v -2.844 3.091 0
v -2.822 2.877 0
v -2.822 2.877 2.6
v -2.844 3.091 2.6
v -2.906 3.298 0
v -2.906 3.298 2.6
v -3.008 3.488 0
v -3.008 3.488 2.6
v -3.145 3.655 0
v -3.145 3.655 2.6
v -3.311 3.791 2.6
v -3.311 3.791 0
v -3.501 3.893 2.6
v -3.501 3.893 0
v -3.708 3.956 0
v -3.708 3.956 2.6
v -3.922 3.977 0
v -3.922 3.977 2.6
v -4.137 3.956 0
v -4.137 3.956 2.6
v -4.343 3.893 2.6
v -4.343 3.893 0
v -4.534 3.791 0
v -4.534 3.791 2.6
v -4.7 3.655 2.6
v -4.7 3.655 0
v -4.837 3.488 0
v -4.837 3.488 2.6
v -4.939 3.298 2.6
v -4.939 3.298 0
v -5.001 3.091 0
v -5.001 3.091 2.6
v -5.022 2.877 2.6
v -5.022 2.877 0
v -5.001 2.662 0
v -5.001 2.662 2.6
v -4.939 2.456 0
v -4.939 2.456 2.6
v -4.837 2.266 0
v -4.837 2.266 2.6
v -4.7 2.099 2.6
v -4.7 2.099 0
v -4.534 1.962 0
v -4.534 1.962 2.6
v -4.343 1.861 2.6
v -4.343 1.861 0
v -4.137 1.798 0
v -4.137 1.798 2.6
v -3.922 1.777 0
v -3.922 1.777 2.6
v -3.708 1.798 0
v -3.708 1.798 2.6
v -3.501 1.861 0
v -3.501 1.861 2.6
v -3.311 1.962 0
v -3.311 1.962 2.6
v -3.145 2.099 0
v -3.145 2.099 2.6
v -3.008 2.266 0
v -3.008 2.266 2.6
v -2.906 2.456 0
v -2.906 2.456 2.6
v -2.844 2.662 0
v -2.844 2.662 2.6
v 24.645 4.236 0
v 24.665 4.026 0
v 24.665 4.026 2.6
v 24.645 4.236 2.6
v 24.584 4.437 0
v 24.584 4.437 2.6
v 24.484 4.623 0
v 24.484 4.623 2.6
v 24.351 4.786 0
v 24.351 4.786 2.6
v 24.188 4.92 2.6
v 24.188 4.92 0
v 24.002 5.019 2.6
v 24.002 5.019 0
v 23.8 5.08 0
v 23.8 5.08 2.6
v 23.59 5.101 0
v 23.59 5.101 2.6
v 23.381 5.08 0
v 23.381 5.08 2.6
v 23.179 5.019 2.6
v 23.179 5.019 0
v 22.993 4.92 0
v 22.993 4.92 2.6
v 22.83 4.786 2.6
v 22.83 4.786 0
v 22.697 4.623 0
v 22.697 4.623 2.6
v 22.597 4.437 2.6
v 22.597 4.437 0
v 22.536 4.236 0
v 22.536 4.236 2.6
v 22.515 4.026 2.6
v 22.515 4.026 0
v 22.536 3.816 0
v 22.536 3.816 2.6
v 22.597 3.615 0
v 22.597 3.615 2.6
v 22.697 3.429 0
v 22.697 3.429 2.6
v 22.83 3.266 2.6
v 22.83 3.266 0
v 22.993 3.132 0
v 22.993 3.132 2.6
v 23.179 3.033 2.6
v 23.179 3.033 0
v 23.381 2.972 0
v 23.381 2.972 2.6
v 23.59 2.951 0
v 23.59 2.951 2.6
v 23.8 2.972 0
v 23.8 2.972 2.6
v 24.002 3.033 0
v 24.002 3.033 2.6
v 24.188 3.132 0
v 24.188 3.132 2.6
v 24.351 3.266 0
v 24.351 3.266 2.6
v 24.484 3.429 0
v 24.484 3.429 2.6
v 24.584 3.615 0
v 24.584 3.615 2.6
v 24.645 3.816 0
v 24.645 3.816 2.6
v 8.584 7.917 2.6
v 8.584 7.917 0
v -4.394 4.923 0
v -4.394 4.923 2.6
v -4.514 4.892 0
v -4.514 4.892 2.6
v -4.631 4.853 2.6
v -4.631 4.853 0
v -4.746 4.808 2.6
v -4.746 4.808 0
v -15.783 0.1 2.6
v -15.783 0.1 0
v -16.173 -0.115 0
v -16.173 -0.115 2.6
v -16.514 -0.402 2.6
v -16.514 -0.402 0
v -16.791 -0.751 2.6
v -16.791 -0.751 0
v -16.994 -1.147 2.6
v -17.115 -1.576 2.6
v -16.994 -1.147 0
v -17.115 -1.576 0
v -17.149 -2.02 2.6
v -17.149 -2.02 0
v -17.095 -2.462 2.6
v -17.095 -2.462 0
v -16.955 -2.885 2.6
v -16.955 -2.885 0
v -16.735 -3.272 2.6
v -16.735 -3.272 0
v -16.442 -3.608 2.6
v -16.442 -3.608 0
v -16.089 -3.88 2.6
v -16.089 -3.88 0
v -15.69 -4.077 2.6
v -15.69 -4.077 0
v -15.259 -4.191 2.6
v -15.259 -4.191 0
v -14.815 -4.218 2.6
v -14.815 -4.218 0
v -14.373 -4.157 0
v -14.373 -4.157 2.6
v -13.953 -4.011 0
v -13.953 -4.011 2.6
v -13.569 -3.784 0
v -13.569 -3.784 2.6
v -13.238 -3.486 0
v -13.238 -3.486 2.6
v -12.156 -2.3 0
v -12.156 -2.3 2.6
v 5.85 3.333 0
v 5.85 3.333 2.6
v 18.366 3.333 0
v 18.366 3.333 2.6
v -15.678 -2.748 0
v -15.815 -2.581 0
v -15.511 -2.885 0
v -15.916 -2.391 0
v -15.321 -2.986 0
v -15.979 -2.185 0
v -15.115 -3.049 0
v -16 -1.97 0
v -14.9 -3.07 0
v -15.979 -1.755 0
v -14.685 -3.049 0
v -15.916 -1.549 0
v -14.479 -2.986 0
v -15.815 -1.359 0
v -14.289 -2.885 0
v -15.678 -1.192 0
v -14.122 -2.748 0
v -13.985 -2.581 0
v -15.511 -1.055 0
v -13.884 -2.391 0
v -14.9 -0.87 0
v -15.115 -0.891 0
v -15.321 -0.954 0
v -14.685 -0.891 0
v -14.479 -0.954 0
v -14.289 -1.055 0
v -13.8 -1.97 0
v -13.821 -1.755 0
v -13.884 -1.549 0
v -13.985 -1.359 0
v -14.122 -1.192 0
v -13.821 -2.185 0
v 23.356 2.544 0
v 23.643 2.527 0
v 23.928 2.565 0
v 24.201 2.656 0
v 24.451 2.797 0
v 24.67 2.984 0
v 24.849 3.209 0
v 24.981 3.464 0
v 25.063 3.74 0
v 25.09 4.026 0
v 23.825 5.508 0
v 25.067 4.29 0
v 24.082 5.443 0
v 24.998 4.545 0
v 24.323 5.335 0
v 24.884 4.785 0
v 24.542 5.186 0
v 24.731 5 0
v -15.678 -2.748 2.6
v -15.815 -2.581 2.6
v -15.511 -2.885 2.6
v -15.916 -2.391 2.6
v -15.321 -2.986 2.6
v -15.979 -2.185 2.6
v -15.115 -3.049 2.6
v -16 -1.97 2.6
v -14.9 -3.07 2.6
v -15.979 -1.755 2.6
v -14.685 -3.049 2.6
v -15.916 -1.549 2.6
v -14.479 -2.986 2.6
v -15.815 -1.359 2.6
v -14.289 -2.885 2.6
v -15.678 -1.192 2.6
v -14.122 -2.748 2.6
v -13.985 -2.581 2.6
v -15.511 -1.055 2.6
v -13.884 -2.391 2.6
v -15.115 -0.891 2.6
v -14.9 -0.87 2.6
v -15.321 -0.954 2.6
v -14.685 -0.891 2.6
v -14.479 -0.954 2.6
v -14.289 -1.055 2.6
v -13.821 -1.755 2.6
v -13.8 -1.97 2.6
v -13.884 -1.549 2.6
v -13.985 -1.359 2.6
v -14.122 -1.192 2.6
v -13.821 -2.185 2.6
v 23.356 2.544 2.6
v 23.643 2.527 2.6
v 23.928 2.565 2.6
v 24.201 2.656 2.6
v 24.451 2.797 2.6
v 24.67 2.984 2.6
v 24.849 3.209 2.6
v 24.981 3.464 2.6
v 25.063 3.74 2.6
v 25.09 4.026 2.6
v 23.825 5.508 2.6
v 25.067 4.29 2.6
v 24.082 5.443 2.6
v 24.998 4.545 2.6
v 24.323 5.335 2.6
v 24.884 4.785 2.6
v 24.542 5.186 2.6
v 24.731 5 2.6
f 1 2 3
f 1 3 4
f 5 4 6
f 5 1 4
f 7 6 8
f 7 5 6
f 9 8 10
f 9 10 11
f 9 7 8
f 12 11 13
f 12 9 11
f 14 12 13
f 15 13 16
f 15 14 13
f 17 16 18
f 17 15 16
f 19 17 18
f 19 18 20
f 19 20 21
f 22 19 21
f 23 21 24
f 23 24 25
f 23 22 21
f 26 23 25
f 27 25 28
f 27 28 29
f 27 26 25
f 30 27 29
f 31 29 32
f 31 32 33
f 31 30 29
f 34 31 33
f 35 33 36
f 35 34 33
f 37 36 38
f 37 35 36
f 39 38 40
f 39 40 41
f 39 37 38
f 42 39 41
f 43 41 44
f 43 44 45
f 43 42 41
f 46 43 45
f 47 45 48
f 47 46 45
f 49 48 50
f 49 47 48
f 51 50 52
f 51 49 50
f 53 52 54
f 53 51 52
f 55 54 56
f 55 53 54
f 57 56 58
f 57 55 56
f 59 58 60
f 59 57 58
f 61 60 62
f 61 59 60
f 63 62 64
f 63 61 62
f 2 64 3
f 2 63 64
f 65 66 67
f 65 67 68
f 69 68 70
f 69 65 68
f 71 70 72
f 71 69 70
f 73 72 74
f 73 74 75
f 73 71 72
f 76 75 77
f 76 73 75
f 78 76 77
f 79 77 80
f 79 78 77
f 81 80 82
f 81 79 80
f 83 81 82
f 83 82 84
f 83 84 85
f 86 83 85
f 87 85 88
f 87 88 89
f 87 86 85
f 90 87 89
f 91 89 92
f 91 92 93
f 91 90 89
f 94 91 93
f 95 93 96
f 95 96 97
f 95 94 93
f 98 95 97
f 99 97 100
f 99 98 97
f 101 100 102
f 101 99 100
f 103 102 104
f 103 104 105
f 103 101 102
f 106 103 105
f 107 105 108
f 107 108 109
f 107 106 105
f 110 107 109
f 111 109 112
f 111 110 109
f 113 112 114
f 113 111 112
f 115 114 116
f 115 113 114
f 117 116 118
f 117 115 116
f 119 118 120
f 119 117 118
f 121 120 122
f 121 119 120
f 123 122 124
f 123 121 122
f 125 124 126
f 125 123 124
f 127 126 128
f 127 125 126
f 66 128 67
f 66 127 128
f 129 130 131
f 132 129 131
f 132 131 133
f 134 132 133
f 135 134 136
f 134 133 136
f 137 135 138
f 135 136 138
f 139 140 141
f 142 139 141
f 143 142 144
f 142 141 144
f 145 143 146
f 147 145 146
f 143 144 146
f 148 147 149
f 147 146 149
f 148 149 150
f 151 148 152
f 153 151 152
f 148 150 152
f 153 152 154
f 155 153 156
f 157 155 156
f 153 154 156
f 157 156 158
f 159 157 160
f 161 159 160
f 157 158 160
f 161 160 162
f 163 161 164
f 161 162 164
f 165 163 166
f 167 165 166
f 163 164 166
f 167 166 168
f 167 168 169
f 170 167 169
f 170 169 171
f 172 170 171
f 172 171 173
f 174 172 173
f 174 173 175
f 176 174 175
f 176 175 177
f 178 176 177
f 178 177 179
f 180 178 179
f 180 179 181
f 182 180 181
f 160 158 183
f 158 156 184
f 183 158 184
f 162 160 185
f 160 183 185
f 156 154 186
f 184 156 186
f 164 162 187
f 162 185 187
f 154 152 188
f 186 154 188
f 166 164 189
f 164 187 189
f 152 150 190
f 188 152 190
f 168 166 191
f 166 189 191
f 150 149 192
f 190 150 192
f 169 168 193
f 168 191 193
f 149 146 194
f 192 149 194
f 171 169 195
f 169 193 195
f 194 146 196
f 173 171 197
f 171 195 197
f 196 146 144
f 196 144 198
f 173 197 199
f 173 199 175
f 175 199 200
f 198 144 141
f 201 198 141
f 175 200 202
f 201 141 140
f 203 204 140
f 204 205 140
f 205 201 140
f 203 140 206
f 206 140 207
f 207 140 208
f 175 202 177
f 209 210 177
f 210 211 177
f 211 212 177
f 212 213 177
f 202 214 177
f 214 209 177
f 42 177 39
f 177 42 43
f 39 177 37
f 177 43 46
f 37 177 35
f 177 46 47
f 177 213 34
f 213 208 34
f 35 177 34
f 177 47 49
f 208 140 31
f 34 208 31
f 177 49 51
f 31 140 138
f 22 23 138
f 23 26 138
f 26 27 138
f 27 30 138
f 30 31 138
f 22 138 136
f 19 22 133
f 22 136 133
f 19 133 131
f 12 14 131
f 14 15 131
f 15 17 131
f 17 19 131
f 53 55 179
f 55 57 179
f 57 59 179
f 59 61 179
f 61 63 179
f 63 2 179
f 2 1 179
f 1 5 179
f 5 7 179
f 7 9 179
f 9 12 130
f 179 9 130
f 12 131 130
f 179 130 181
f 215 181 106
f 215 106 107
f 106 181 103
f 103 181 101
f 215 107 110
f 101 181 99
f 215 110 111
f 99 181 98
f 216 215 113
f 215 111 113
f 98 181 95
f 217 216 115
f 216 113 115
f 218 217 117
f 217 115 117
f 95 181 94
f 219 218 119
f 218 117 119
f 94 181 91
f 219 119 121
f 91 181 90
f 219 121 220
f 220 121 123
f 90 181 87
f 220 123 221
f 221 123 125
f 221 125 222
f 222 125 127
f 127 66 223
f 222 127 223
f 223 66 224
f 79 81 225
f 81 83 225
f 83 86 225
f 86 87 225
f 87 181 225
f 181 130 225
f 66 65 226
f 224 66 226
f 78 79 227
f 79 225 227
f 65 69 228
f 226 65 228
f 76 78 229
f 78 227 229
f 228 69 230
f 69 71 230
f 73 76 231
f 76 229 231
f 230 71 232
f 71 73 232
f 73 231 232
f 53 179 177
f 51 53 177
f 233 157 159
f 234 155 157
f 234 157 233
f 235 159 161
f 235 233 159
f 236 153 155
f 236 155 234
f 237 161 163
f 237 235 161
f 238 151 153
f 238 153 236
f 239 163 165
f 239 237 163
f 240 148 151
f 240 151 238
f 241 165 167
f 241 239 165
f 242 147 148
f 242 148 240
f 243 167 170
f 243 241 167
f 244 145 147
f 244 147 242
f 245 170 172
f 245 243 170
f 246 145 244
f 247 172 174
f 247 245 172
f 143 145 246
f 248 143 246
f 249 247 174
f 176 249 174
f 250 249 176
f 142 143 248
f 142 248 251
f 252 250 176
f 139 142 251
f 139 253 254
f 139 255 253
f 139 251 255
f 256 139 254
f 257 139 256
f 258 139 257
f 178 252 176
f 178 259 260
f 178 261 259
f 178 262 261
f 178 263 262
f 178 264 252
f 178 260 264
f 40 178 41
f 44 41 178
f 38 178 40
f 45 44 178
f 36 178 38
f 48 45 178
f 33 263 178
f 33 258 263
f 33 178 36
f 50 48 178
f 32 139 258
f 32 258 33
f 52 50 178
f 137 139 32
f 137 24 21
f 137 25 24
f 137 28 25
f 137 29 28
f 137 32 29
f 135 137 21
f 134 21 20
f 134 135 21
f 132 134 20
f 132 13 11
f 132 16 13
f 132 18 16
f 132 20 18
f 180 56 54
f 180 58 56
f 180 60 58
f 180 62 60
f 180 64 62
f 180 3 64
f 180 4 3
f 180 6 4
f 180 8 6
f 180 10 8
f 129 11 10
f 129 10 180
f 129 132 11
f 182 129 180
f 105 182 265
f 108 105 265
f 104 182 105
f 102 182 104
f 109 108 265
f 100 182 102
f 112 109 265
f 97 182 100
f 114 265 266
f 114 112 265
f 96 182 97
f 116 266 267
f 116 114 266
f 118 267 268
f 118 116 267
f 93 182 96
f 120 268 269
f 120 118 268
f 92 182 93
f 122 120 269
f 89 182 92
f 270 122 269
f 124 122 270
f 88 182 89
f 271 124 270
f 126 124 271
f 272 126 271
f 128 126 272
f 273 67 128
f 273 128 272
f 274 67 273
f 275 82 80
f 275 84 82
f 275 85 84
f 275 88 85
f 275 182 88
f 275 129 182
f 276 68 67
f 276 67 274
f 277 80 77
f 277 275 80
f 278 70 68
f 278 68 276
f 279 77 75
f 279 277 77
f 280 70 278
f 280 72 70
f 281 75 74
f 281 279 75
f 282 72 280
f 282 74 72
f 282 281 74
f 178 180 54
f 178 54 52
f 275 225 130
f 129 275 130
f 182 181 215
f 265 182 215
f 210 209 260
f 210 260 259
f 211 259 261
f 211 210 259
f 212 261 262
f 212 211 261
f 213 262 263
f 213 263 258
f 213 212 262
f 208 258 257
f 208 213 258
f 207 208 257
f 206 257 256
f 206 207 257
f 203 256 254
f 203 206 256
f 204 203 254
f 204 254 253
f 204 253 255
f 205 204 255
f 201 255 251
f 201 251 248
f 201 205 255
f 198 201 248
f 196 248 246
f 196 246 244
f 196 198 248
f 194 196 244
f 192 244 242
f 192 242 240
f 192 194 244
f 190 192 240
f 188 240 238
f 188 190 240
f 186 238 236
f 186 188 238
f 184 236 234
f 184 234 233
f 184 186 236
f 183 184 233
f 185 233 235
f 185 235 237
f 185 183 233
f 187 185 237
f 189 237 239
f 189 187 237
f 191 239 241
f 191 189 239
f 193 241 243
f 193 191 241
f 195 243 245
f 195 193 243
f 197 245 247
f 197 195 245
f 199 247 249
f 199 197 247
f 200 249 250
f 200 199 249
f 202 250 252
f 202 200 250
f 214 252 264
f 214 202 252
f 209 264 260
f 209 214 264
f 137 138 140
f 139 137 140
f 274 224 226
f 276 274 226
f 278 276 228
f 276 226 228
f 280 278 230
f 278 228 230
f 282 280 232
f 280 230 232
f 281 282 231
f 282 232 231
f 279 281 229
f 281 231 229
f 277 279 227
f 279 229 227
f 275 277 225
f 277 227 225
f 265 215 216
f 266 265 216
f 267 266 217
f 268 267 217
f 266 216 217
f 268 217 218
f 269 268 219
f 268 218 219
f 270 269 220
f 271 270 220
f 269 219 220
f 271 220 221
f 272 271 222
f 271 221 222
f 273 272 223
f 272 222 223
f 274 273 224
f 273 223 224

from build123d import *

# Parameters (mm, degrees)
F0_R     = 1.1
F0_R_2   = 1.075
F1_DEPTH = 2.6


with BuildPart() as f1:
    # F0 (on Top) → F1 (new body)
    with BuildSketch(Plane.XY):
        with BuildLine():
            ThreePointArc((-4.746486, 4.808329), (-5.079824, 1.124576), (-1.822392, 2.876799))
            ThreePointArc((-1.822392, 2.876799), (-2.614969, 4.520158), (-4.394433, 4.923045))
            ThreePointArc((-4.394433, 4.923045), (-4.572993, 4.873462), (-4.746486, 4.808329))
        make_face()
        with Locations((-3.922381, 2.876799)):
            Circle(F0_R, mode=Mode.SUBTRACT)
        with BuildLine():
            ThreePointArc((-4.394433, 4.923045), (-2.614969, 4.520158), (-1.822392, 2.876799))
            ThreePointArc((-1.822392, 2.876799), (-5.079824, 1.124576), (-4.746486, 4.808329))
            Line((-4.746486, 4.808329), (-15.782993, 0.099507))
            ThreePointArc((-15.782993, 0.099507), (-13.659897, -0.09261), (-12.65002, -1.97))
            ThreePointArc((-12.65002, -1.97), (-12.802118, -2.78321), (-13.237851, -3.486475))
            Line((-13.237851, -3.486475), (-12.155538, -2.30018))
            Line((-12.155538, -2.30018), (5.849769, 3.333367))
            Line((5.849769, 3.333367), (18.365619, 3.333367))
            Line((18.365619, 3.333367), (23.356251, 2.544399))
            ThreePointArc((23.356251, 2.544399), (22.108876, 4.260224), (23.824702, 5.507599))
            Line((23.824702, 5.507599), (8.583845, 7.917022))
            Line((8.583845, 7.917022), (-4.394433, 4.923045))
        make_face()
        with BuildLine():
            ThreePointArc((-12.65002, -1.97), (-13.659897, -0.09261), (-15.782993, 0.099507))
            ThreePointArc((-15.782993, 0.099507), (-16.73485, -3.272267), (-13.237851, -3.486475))
            ThreePointArc((-13.237851, -3.486475), (-12.802118, -2.78321), (-12.65002, -1.97))
        make_face()
        with Locations((-14.90002, -1.97)):
            Circle(F0_R, mode=Mode.SUBTRACT)
        with BuildLine():
            ThreePointArc((25.090476, 4.025999), (24.730945, 5.000335), (23.824702, 5.507599))
            ThreePointArc((23.824702, 5.507599), (22.108876, 4.260224), (23.356251, 2.544399))
            ThreePointArc((23.356251, 2.544399), (24.564812, 2.88553), (25.090476, 4.025999))
        make_face()
        with Locations((23.590476, 4.025999)):
            Circle(F0_R_2, mode=Mode.SUBTRACT)
    extrude(amount=F1_DEPTH)


solid = f1.part
